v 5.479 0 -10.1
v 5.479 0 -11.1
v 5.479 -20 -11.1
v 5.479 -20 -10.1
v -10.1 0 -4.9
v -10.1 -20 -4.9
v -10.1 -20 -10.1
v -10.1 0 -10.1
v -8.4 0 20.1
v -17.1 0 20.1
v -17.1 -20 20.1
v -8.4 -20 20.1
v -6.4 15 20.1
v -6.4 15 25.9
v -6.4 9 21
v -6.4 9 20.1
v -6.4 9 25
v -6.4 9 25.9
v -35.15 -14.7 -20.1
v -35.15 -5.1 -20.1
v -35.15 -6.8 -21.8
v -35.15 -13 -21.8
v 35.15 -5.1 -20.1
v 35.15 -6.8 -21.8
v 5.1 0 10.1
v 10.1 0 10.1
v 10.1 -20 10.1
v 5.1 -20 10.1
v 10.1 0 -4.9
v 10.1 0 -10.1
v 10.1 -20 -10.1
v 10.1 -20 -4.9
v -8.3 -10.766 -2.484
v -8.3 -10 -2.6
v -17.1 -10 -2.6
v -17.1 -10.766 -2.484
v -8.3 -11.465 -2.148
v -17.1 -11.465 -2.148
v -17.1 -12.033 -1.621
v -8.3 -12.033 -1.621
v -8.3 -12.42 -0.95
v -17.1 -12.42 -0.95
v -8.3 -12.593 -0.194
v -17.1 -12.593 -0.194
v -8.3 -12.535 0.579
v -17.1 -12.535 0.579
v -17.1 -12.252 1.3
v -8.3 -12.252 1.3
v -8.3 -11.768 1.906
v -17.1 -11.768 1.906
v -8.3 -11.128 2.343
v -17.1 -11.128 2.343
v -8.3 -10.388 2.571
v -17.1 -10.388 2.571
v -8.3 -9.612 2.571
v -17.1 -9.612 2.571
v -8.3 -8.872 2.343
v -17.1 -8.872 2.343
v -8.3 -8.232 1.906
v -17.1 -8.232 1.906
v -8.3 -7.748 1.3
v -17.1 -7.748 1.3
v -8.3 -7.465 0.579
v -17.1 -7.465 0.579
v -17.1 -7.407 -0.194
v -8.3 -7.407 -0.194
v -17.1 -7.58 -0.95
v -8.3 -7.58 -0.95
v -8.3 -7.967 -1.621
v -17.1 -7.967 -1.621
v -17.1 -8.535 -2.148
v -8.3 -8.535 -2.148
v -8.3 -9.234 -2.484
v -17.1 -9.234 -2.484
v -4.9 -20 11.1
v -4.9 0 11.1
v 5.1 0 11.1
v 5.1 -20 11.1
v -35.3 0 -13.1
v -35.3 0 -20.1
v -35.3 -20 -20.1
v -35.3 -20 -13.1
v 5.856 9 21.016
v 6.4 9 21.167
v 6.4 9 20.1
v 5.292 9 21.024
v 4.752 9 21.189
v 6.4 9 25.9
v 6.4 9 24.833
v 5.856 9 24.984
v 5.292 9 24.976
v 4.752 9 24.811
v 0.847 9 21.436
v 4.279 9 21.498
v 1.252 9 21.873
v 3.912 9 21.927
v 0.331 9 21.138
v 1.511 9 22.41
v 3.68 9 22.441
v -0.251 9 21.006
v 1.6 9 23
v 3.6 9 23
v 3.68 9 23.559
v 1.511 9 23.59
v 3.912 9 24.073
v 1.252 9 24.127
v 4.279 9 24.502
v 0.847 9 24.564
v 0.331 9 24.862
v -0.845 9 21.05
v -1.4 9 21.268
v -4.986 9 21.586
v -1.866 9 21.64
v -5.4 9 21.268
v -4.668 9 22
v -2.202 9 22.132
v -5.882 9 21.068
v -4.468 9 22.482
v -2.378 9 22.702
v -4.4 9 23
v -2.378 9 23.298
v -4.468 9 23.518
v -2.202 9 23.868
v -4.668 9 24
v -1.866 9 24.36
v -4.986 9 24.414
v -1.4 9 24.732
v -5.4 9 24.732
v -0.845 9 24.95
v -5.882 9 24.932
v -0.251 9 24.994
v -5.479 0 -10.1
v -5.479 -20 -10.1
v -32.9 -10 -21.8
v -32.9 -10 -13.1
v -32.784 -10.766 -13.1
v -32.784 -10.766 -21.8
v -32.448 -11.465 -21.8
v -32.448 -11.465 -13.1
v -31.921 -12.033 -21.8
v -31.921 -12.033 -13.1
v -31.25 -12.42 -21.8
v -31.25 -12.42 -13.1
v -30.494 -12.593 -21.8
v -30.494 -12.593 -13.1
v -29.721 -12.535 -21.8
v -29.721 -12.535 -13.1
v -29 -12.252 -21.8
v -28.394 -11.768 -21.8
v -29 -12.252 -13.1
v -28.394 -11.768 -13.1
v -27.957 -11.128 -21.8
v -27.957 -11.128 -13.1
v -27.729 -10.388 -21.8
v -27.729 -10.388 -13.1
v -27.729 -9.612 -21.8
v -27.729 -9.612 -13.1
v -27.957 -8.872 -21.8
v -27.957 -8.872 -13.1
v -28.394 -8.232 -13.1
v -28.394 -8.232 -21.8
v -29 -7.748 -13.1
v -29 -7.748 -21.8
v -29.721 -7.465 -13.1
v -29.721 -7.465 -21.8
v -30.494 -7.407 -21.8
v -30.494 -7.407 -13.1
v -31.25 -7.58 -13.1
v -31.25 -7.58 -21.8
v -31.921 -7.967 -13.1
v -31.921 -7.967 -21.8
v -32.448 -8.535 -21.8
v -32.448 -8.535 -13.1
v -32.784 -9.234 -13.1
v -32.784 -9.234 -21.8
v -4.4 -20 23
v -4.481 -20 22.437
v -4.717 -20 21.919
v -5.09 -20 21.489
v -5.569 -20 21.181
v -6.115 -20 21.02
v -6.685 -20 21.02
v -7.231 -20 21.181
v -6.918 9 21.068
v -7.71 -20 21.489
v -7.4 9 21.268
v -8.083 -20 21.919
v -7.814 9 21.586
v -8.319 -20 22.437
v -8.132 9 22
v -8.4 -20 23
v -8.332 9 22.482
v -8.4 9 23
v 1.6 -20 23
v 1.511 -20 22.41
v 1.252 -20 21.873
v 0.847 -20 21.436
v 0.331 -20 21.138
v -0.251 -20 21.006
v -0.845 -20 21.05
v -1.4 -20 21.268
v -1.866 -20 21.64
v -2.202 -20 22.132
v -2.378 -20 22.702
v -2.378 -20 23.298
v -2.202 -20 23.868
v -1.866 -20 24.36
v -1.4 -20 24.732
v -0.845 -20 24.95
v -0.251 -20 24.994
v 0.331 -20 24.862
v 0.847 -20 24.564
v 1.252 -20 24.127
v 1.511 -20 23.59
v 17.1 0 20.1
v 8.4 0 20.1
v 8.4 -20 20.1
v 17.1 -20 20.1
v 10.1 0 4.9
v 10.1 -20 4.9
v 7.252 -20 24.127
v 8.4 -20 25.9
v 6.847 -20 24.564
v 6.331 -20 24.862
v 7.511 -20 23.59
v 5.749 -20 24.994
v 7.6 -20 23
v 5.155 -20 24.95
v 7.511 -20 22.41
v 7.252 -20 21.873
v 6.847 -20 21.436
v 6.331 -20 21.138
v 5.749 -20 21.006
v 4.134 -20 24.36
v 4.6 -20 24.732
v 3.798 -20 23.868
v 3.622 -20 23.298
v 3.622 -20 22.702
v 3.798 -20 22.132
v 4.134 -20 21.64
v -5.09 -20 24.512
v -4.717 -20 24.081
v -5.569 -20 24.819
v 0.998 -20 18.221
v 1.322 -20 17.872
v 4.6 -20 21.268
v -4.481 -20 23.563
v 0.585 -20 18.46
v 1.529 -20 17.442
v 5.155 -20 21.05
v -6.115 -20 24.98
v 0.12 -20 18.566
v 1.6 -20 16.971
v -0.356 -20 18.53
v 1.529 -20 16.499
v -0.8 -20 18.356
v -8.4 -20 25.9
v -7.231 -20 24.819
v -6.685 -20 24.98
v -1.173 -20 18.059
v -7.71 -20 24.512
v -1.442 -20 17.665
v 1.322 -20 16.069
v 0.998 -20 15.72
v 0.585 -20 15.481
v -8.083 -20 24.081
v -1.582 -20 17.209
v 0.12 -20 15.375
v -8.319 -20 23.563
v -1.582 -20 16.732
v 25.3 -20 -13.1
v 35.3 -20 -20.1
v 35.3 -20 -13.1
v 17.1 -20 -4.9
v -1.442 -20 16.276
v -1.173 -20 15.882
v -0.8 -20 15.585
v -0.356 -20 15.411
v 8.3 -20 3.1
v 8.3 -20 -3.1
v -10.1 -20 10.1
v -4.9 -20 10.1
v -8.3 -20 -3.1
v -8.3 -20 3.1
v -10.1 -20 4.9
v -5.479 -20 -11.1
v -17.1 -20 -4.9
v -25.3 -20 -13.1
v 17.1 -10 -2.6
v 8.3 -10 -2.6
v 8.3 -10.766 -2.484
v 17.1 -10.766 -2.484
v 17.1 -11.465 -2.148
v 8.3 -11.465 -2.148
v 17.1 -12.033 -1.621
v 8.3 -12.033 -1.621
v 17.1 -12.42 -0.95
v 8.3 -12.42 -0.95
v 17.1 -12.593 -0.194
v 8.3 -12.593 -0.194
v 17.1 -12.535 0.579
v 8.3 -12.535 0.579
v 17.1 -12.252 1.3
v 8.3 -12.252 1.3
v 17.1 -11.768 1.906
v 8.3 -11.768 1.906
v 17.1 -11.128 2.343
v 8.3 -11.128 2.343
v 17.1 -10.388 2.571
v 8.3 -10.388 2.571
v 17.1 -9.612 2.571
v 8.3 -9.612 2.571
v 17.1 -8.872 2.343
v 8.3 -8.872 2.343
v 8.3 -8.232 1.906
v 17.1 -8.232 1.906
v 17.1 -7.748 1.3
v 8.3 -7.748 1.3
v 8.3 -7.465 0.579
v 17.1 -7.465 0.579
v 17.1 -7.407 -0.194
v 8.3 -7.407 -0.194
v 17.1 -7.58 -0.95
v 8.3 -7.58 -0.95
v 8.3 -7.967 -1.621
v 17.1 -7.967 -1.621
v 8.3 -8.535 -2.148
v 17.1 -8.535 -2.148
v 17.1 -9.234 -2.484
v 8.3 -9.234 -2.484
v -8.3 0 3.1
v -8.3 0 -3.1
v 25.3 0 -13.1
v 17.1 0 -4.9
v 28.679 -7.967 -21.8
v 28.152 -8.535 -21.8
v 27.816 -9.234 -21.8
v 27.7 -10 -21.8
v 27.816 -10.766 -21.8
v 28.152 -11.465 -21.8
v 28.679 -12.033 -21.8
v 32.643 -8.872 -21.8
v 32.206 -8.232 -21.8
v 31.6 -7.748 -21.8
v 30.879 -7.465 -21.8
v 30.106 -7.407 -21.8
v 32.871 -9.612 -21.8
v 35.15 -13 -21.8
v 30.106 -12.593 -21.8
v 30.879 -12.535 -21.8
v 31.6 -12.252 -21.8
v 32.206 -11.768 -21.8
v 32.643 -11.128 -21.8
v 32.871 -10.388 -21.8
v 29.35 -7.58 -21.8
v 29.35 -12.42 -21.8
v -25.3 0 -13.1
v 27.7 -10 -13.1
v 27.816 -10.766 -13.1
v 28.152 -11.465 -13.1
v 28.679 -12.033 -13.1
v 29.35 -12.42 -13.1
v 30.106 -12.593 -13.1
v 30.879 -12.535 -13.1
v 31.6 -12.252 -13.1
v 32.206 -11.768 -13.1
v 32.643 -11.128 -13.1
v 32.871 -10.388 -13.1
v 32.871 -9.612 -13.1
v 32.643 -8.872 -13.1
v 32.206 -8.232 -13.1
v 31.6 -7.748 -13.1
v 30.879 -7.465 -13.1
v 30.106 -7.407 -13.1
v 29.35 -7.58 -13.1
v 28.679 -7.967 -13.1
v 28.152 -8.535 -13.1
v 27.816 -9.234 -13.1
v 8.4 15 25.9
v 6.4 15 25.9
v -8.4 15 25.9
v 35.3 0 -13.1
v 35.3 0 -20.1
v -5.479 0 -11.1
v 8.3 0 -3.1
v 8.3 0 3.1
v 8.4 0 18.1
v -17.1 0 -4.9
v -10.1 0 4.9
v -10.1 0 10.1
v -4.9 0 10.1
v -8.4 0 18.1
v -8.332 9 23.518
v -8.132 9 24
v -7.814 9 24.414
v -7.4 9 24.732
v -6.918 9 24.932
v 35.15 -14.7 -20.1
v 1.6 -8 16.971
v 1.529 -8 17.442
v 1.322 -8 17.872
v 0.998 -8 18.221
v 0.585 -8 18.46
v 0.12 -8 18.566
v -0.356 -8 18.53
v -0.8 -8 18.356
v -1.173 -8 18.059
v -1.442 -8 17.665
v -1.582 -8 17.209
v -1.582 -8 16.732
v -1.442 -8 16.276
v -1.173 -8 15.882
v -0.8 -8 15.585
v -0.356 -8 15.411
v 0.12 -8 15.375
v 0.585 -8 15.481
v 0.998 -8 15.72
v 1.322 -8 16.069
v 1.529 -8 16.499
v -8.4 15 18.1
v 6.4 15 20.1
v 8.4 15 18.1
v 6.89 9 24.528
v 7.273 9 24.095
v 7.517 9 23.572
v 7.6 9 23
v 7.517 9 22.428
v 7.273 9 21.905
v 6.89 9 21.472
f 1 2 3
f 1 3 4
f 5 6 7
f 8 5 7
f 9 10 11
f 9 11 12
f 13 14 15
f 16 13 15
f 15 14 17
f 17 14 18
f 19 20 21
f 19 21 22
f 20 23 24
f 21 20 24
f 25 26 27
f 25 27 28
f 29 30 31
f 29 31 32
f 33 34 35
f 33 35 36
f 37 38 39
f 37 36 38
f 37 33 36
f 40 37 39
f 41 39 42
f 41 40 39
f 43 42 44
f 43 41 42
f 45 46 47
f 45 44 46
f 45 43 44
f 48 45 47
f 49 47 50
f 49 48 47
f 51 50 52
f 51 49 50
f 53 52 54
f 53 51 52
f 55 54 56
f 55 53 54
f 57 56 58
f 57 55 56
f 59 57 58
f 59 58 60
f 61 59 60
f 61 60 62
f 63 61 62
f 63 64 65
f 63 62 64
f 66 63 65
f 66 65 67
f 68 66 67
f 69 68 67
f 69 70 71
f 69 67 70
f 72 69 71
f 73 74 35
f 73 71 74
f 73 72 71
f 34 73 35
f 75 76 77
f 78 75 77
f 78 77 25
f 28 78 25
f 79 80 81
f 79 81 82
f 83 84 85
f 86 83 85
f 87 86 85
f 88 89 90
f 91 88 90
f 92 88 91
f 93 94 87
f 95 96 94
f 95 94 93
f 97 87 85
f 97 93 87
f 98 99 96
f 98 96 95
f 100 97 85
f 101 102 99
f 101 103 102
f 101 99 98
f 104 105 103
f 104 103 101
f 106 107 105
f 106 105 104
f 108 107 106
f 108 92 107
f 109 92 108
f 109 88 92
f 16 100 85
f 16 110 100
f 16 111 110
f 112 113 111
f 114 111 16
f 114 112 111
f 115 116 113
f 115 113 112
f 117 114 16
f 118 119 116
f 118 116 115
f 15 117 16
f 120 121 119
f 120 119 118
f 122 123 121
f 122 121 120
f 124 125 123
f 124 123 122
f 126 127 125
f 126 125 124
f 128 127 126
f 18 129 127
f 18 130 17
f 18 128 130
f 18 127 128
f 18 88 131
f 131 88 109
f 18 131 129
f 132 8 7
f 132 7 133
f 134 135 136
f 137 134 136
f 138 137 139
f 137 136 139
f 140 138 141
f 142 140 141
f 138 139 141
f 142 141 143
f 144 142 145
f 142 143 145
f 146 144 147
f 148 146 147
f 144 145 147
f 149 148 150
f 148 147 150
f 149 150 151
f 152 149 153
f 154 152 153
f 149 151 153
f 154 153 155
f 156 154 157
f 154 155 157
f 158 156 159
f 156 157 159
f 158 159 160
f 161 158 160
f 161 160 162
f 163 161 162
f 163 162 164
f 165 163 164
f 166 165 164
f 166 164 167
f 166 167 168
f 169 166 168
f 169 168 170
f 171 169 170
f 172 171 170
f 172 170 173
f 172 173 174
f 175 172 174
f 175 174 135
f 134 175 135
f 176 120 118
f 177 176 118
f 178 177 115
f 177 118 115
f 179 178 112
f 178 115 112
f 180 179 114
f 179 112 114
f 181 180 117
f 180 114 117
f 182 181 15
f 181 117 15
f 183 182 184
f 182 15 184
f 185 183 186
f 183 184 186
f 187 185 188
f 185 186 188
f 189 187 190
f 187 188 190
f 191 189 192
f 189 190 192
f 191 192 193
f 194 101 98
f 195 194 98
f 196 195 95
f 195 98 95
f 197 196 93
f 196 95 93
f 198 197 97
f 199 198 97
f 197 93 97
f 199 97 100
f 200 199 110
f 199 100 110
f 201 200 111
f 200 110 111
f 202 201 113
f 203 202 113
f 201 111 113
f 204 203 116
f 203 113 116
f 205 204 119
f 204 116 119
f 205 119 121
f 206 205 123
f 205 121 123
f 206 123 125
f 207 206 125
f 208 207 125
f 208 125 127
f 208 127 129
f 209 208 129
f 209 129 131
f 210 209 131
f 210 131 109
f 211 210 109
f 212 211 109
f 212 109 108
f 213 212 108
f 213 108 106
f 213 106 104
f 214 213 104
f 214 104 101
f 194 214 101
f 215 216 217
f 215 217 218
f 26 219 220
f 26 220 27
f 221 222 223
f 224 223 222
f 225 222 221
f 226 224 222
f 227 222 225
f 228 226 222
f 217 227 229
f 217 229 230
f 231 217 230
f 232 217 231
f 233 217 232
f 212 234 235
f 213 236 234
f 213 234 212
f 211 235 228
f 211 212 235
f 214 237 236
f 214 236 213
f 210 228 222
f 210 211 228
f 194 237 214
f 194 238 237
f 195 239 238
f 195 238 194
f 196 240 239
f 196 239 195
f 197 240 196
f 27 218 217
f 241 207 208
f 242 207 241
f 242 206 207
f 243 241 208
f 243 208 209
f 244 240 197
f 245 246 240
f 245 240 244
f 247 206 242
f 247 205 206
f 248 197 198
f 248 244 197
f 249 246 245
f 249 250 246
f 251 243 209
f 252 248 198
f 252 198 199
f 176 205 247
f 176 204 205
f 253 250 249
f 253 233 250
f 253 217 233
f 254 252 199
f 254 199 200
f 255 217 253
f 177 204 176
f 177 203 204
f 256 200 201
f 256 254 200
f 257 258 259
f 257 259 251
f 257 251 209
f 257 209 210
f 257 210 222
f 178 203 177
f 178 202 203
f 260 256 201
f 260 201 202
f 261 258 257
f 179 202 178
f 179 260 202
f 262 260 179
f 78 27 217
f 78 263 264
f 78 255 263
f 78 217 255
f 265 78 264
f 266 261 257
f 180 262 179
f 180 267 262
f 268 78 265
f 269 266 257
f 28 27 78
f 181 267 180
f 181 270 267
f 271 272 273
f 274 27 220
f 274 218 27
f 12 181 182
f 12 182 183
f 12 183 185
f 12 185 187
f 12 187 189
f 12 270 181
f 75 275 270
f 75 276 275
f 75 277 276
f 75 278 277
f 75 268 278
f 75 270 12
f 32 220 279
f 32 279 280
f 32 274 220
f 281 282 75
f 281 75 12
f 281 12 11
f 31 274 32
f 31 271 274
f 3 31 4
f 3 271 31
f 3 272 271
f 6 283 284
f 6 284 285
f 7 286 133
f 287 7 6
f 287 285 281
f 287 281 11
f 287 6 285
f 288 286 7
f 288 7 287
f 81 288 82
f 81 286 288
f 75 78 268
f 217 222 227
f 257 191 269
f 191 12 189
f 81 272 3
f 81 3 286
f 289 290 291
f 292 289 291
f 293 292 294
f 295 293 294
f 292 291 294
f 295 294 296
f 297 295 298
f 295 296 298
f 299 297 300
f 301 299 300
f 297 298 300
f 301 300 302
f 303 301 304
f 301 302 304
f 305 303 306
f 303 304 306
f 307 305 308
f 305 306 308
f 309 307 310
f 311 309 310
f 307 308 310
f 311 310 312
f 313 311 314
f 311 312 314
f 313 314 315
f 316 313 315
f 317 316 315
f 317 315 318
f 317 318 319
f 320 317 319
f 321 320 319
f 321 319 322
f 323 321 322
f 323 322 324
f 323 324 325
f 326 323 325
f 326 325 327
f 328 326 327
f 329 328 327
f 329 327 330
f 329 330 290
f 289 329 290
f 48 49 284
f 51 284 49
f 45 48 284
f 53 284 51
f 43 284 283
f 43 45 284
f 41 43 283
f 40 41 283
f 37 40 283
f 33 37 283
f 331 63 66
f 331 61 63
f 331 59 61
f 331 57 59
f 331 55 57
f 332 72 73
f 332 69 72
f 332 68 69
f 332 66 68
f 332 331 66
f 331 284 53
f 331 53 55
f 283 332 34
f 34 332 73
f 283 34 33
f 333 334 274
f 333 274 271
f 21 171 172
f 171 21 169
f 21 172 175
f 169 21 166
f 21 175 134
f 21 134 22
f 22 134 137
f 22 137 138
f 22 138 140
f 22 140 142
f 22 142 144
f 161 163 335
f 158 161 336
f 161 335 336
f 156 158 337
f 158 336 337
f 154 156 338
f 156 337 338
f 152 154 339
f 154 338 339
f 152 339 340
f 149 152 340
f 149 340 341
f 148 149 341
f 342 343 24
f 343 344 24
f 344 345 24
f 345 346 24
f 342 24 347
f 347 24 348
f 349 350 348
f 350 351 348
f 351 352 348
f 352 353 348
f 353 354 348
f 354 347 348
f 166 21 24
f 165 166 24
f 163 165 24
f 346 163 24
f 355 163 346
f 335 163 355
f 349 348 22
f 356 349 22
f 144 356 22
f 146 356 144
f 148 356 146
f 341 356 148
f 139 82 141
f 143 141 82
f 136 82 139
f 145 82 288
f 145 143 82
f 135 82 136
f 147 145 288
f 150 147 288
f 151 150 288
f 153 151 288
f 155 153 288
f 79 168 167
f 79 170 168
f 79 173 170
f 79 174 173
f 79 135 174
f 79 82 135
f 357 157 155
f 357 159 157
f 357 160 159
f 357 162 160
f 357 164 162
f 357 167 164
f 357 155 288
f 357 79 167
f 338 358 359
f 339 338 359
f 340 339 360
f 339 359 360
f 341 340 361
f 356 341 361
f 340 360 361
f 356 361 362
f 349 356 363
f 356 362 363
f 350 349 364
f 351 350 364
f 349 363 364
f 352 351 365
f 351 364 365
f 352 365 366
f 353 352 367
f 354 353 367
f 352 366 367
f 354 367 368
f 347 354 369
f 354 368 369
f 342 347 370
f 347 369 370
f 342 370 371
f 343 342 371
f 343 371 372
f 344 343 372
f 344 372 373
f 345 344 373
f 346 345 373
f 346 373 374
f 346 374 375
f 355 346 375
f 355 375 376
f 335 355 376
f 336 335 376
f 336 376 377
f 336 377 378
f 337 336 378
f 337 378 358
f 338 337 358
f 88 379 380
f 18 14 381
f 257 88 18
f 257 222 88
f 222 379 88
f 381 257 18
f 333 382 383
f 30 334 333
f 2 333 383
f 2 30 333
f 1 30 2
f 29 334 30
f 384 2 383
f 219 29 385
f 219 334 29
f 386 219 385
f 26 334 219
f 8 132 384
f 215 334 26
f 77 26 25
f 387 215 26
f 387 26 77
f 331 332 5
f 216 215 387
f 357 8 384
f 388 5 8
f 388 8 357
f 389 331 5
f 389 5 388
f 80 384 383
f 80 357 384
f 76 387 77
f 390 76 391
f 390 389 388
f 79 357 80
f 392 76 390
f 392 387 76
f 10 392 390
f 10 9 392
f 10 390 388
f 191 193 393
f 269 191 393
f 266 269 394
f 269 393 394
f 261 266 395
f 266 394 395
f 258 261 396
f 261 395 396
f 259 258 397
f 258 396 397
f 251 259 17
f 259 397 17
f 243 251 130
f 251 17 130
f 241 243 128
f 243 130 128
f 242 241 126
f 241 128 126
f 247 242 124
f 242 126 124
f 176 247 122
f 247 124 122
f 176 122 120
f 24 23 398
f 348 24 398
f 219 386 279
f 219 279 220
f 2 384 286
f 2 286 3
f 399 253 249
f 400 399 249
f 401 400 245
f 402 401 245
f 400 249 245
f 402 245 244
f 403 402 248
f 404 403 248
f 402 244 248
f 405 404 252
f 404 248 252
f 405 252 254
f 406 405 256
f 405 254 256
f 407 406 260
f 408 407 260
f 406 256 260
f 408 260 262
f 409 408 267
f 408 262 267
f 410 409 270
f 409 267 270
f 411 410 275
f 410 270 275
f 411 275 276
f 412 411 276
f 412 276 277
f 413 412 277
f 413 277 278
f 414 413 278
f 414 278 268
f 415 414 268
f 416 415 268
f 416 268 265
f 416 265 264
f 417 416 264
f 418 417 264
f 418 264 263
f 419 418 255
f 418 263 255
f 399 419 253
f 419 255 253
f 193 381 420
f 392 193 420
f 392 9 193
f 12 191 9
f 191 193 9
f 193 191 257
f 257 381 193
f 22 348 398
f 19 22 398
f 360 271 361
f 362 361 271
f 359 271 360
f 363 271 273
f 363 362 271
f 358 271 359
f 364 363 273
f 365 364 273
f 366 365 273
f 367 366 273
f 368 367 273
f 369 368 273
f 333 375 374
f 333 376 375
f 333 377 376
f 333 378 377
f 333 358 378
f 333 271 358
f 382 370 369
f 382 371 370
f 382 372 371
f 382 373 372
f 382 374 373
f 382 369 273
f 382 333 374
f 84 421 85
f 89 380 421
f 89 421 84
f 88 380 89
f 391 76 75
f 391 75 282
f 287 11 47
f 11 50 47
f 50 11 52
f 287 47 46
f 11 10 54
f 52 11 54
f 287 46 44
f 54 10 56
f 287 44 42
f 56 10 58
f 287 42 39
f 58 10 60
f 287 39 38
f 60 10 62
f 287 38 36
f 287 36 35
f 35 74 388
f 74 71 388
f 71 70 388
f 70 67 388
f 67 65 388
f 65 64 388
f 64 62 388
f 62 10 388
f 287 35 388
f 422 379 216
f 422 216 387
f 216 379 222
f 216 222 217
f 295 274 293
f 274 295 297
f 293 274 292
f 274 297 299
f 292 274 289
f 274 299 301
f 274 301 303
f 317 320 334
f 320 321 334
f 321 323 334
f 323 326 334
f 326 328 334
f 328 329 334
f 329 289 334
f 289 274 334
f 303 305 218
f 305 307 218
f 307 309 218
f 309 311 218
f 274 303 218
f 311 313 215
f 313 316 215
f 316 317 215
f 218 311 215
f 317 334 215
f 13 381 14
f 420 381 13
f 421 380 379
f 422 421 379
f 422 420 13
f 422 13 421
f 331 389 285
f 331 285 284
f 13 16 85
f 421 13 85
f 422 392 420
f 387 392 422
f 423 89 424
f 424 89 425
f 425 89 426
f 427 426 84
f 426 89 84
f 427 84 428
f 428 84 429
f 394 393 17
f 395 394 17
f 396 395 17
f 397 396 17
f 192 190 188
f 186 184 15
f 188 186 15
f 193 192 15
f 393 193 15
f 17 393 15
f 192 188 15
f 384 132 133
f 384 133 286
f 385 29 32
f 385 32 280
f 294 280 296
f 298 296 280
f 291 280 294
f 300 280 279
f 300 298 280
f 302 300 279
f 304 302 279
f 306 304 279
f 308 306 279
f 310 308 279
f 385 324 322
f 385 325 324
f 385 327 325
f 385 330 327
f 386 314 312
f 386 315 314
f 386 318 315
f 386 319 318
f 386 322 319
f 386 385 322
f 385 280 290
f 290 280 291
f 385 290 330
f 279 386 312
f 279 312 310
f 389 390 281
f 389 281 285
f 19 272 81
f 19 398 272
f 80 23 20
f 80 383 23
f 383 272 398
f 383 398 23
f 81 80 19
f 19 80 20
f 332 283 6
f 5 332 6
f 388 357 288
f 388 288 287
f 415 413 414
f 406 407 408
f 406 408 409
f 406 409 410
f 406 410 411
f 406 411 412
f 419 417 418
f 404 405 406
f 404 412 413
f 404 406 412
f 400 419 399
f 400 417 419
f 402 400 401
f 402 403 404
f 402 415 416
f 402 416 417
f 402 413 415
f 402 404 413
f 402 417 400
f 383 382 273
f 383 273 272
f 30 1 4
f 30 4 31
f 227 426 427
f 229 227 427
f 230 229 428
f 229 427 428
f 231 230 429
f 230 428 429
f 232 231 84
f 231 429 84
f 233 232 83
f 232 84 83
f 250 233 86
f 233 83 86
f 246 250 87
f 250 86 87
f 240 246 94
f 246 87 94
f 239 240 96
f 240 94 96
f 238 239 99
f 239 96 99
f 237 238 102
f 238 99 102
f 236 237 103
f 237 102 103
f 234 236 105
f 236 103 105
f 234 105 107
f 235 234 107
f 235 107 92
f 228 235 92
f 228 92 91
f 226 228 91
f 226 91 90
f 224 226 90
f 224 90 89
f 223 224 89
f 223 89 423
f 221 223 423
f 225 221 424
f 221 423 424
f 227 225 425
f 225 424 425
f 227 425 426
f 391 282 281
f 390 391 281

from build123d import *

# Parameters (mm, degrees)
PAD_DEPTH           = 20
SKETCH001_R         = 2.6
POCKET_DEPTH        = 100
POCKET001_DEPTH     = 40
PAD001_DEPTH        = 70.3
SKETCH004_R         = 2.6
POCKET002_DEPTH     = 10
SKETCH005_R         = 2.6
POCKET003_DEPTH     = 10
SKETCH006_W         = 10
SKETCH006_H         = 1
POCKET004_DEPTH     = 25
SKETCH007_W         = 16.8
SKETCH007_H         = 35
PAD002_DEPTH        = 5.8
SKETCH008_W         = 12.8
SKETCH008_H         = 6
POCKET005_DEPTH     = 5.8
SKETCH009_W         = 16.8
SKETCH009_H         = 2
PAD003_DEPTH        = 15
SKETCH010_R         = 2
POCKET006_DEPTH     = 40
LINEARPATTERN_COUNT = 3
LINEARPATTERN_PITCH = 6
SKETCH011_R         = 1.6
POCKET007_DEPTH     = 12


with BuildPart() as part:
    # Sketch → Pad (new body)
    with BuildSketch(Plane.XZ):
        Polygon((17.1, 10.100008), (17.1, -4.899992), (25.3, -13.099992), (35.3, -13.099992), (35.3, -20.099992), (-35.3, -20.099992), (-35.3, -13.099992), (-25.3, -13.099992), (-17.1, -4.899992), (-17.1, 10.100008), (-17.1, 20.100008), (17.1, 20.100008), align=None)
        Polygon((-10.1, 10.100008), (-10.1, 4.900008), (-8.3, 3.099992), (-8.3, -3.100008), (-10.1, -4.899992), (-10.1, -10.099992), (-5.478931, -10.099992), (-5.478931, -11.099992), (5.478931, -11.099992), (5.478931, -10.099992), (10.1, -10.099992), (10.1, -4.899992), (8.3, -3.099992), (8.3, 3.100008), (10.1, 4.900008), (10.1, 10.100008), align=None, mode=Mode.SUBTRACT)
    extrude(amount=PAD_DEPTH)

    # Sketch001 (on Face22 of Pad) → Pocket (cut)
    with BuildSketch(Plane(origin=(8.3, 0, 0), x_dir=(0, 0, -1), z_dir=(-1, 0, 0))):
        with Locations((0, 10)):
            Circle(SKETCH001_R)
    extrude(amount=-POCKET_DEPTH, mode=Mode.SUBTRACT)

    # Sketch001 (on Face22 of Pad) → Pocket001 (cut)
    with BuildSketch(Plane(origin=(8.3, 0, 0), x_dir=(0, 0, -1), z_dir=(-1, 0, 0))):
        with Locations((0, 10)):
            Circle(SKETCH001_R)
    extrude(amount=POCKET001_DEPTH, mode=Mode.SUBTRACT)

    # Sketch003 → Pad001 (join)
    with BuildSketch(Plane(origin=(35.15, 0, 0), x_dir=(0, 0, 1), z_dir=(1, 0, 0))):
        Polygon((-20.000008, 14.8), (-20.000008, 5), (-21.800008, 6.8), (-21.800008, 13), align=None)
    extrude(amount=-PAD001_DEPTH)

    # Sketch004 (on Face3 of Pad001) → Pocket002 (cut)
    with BuildSketch(Plane(origin=(0, 0, -13.099992), x_dir=(-1, 0, 0), z_dir=(0, 0, 1))):
        with Locations((-30.3, 10)):
            Circle(SKETCH004_R)
    extrude(amount=-POCKET002_DEPTH, mode=Mode.SUBTRACT)

    # Sketch005 (on Face12 of Pocket002) → Pocket003 (cut)
    with BuildSketch(Plane(origin=(0, 0, -13.099992), x_dir=(-1, 0, 0), z_dir=(0, 0, 1))):
        with Locations((30.3, 10)):
            Circle(SKETCH005_R)
    extrude(amount=-POCKET003_DEPTH, mode=Mode.SUBTRACT)

    # Sketch006 (on Face4 of Pocket003) → Pocket004 (cut)
    with BuildSketch(Plane(origin=(0, 0, 0), x_dir=(1, 0, 0), z_dir=(0, 1, 0))):
        with Locations((0.1, -10.600008)):
            Rectangle(SKETCH006_W, SKETCH006_H)
    extrude(amount=-POCKET004_DEPTH, mode=Mode.SUBTRACT)

    # Sketch007 (on Face6 of Pocket004) → Pad002 (join)
    with BuildSketch(Plane(origin=(0, 0, 20.100008), x_dir=(-1, 0, 0), z_dir=(0, 0, 1))):
        with Locations((0, 2.5)):
            Rectangle(SKETCH007_W, SKETCH007_H)
    extrude(amount=PAD002_DEPTH)

    # Sketch008 (on Face46 of Pad002) → Pocket005 (cut)
    with BuildSketch(Plane(origin=(0, 0, 25.900008), x_dir=(-1, 0, 0), z_dir=(0, 0, 1))):
        with Locations((0, -12)):
            Rectangle(SKETCH008_W, SKETCH008_H)
    extrude(amount=-POCKET005_DEPTH, mode=Mode.SUBTRACT)

    # Sketch009 (on Face4 of Pocket005) → Pad003 (join)
    with BuildSketch(Plane(origin=(0, 0, 0), x_dir=(1, 0, 0), z_dir=(0, 1, 0))):
        with Locations((0, -19.100008)):
            Rectangle(SKETCH009_W, SKETCH009_H)
    extrude(amount=PAD003_DEPTH)

    # Sketch010 (on Face46 of Pad003) → Pocket006 (cut)
    with BuildSketch(Plane(origin=(0, 9, 0), x_dir=(1, 0, 0), z_dir=(0, 1, 0))):
        with Locations((-6.4, -23.000008)):
            Circle(SKETCH010_R)
    pocket006 = extrude(amount=-POCKET006_DEPTH, mode=Mode.SUBTRACT)

    # LinearPattern: Pocket006 ×3
    with Locations(*[(i * LINEARPATTERN_PITCH, 0, 0) for i in range(1, LINEARPATTERN_COUNT)]):
        add(pocket006, mode=Mode.SUBTRACT)

    # Sketch011 (on Face5 of LinearPattern) → Pocket007 (cut)
    with BuildSketch(Plane.XZ.offset(20)):
        with Locations((0, 16.970566)):
            Circle(SKETCH011_R)
    extrude(amount=-POCKET007_DEPTH, mode=Mode.SUBTRACT)


solid = part.part
